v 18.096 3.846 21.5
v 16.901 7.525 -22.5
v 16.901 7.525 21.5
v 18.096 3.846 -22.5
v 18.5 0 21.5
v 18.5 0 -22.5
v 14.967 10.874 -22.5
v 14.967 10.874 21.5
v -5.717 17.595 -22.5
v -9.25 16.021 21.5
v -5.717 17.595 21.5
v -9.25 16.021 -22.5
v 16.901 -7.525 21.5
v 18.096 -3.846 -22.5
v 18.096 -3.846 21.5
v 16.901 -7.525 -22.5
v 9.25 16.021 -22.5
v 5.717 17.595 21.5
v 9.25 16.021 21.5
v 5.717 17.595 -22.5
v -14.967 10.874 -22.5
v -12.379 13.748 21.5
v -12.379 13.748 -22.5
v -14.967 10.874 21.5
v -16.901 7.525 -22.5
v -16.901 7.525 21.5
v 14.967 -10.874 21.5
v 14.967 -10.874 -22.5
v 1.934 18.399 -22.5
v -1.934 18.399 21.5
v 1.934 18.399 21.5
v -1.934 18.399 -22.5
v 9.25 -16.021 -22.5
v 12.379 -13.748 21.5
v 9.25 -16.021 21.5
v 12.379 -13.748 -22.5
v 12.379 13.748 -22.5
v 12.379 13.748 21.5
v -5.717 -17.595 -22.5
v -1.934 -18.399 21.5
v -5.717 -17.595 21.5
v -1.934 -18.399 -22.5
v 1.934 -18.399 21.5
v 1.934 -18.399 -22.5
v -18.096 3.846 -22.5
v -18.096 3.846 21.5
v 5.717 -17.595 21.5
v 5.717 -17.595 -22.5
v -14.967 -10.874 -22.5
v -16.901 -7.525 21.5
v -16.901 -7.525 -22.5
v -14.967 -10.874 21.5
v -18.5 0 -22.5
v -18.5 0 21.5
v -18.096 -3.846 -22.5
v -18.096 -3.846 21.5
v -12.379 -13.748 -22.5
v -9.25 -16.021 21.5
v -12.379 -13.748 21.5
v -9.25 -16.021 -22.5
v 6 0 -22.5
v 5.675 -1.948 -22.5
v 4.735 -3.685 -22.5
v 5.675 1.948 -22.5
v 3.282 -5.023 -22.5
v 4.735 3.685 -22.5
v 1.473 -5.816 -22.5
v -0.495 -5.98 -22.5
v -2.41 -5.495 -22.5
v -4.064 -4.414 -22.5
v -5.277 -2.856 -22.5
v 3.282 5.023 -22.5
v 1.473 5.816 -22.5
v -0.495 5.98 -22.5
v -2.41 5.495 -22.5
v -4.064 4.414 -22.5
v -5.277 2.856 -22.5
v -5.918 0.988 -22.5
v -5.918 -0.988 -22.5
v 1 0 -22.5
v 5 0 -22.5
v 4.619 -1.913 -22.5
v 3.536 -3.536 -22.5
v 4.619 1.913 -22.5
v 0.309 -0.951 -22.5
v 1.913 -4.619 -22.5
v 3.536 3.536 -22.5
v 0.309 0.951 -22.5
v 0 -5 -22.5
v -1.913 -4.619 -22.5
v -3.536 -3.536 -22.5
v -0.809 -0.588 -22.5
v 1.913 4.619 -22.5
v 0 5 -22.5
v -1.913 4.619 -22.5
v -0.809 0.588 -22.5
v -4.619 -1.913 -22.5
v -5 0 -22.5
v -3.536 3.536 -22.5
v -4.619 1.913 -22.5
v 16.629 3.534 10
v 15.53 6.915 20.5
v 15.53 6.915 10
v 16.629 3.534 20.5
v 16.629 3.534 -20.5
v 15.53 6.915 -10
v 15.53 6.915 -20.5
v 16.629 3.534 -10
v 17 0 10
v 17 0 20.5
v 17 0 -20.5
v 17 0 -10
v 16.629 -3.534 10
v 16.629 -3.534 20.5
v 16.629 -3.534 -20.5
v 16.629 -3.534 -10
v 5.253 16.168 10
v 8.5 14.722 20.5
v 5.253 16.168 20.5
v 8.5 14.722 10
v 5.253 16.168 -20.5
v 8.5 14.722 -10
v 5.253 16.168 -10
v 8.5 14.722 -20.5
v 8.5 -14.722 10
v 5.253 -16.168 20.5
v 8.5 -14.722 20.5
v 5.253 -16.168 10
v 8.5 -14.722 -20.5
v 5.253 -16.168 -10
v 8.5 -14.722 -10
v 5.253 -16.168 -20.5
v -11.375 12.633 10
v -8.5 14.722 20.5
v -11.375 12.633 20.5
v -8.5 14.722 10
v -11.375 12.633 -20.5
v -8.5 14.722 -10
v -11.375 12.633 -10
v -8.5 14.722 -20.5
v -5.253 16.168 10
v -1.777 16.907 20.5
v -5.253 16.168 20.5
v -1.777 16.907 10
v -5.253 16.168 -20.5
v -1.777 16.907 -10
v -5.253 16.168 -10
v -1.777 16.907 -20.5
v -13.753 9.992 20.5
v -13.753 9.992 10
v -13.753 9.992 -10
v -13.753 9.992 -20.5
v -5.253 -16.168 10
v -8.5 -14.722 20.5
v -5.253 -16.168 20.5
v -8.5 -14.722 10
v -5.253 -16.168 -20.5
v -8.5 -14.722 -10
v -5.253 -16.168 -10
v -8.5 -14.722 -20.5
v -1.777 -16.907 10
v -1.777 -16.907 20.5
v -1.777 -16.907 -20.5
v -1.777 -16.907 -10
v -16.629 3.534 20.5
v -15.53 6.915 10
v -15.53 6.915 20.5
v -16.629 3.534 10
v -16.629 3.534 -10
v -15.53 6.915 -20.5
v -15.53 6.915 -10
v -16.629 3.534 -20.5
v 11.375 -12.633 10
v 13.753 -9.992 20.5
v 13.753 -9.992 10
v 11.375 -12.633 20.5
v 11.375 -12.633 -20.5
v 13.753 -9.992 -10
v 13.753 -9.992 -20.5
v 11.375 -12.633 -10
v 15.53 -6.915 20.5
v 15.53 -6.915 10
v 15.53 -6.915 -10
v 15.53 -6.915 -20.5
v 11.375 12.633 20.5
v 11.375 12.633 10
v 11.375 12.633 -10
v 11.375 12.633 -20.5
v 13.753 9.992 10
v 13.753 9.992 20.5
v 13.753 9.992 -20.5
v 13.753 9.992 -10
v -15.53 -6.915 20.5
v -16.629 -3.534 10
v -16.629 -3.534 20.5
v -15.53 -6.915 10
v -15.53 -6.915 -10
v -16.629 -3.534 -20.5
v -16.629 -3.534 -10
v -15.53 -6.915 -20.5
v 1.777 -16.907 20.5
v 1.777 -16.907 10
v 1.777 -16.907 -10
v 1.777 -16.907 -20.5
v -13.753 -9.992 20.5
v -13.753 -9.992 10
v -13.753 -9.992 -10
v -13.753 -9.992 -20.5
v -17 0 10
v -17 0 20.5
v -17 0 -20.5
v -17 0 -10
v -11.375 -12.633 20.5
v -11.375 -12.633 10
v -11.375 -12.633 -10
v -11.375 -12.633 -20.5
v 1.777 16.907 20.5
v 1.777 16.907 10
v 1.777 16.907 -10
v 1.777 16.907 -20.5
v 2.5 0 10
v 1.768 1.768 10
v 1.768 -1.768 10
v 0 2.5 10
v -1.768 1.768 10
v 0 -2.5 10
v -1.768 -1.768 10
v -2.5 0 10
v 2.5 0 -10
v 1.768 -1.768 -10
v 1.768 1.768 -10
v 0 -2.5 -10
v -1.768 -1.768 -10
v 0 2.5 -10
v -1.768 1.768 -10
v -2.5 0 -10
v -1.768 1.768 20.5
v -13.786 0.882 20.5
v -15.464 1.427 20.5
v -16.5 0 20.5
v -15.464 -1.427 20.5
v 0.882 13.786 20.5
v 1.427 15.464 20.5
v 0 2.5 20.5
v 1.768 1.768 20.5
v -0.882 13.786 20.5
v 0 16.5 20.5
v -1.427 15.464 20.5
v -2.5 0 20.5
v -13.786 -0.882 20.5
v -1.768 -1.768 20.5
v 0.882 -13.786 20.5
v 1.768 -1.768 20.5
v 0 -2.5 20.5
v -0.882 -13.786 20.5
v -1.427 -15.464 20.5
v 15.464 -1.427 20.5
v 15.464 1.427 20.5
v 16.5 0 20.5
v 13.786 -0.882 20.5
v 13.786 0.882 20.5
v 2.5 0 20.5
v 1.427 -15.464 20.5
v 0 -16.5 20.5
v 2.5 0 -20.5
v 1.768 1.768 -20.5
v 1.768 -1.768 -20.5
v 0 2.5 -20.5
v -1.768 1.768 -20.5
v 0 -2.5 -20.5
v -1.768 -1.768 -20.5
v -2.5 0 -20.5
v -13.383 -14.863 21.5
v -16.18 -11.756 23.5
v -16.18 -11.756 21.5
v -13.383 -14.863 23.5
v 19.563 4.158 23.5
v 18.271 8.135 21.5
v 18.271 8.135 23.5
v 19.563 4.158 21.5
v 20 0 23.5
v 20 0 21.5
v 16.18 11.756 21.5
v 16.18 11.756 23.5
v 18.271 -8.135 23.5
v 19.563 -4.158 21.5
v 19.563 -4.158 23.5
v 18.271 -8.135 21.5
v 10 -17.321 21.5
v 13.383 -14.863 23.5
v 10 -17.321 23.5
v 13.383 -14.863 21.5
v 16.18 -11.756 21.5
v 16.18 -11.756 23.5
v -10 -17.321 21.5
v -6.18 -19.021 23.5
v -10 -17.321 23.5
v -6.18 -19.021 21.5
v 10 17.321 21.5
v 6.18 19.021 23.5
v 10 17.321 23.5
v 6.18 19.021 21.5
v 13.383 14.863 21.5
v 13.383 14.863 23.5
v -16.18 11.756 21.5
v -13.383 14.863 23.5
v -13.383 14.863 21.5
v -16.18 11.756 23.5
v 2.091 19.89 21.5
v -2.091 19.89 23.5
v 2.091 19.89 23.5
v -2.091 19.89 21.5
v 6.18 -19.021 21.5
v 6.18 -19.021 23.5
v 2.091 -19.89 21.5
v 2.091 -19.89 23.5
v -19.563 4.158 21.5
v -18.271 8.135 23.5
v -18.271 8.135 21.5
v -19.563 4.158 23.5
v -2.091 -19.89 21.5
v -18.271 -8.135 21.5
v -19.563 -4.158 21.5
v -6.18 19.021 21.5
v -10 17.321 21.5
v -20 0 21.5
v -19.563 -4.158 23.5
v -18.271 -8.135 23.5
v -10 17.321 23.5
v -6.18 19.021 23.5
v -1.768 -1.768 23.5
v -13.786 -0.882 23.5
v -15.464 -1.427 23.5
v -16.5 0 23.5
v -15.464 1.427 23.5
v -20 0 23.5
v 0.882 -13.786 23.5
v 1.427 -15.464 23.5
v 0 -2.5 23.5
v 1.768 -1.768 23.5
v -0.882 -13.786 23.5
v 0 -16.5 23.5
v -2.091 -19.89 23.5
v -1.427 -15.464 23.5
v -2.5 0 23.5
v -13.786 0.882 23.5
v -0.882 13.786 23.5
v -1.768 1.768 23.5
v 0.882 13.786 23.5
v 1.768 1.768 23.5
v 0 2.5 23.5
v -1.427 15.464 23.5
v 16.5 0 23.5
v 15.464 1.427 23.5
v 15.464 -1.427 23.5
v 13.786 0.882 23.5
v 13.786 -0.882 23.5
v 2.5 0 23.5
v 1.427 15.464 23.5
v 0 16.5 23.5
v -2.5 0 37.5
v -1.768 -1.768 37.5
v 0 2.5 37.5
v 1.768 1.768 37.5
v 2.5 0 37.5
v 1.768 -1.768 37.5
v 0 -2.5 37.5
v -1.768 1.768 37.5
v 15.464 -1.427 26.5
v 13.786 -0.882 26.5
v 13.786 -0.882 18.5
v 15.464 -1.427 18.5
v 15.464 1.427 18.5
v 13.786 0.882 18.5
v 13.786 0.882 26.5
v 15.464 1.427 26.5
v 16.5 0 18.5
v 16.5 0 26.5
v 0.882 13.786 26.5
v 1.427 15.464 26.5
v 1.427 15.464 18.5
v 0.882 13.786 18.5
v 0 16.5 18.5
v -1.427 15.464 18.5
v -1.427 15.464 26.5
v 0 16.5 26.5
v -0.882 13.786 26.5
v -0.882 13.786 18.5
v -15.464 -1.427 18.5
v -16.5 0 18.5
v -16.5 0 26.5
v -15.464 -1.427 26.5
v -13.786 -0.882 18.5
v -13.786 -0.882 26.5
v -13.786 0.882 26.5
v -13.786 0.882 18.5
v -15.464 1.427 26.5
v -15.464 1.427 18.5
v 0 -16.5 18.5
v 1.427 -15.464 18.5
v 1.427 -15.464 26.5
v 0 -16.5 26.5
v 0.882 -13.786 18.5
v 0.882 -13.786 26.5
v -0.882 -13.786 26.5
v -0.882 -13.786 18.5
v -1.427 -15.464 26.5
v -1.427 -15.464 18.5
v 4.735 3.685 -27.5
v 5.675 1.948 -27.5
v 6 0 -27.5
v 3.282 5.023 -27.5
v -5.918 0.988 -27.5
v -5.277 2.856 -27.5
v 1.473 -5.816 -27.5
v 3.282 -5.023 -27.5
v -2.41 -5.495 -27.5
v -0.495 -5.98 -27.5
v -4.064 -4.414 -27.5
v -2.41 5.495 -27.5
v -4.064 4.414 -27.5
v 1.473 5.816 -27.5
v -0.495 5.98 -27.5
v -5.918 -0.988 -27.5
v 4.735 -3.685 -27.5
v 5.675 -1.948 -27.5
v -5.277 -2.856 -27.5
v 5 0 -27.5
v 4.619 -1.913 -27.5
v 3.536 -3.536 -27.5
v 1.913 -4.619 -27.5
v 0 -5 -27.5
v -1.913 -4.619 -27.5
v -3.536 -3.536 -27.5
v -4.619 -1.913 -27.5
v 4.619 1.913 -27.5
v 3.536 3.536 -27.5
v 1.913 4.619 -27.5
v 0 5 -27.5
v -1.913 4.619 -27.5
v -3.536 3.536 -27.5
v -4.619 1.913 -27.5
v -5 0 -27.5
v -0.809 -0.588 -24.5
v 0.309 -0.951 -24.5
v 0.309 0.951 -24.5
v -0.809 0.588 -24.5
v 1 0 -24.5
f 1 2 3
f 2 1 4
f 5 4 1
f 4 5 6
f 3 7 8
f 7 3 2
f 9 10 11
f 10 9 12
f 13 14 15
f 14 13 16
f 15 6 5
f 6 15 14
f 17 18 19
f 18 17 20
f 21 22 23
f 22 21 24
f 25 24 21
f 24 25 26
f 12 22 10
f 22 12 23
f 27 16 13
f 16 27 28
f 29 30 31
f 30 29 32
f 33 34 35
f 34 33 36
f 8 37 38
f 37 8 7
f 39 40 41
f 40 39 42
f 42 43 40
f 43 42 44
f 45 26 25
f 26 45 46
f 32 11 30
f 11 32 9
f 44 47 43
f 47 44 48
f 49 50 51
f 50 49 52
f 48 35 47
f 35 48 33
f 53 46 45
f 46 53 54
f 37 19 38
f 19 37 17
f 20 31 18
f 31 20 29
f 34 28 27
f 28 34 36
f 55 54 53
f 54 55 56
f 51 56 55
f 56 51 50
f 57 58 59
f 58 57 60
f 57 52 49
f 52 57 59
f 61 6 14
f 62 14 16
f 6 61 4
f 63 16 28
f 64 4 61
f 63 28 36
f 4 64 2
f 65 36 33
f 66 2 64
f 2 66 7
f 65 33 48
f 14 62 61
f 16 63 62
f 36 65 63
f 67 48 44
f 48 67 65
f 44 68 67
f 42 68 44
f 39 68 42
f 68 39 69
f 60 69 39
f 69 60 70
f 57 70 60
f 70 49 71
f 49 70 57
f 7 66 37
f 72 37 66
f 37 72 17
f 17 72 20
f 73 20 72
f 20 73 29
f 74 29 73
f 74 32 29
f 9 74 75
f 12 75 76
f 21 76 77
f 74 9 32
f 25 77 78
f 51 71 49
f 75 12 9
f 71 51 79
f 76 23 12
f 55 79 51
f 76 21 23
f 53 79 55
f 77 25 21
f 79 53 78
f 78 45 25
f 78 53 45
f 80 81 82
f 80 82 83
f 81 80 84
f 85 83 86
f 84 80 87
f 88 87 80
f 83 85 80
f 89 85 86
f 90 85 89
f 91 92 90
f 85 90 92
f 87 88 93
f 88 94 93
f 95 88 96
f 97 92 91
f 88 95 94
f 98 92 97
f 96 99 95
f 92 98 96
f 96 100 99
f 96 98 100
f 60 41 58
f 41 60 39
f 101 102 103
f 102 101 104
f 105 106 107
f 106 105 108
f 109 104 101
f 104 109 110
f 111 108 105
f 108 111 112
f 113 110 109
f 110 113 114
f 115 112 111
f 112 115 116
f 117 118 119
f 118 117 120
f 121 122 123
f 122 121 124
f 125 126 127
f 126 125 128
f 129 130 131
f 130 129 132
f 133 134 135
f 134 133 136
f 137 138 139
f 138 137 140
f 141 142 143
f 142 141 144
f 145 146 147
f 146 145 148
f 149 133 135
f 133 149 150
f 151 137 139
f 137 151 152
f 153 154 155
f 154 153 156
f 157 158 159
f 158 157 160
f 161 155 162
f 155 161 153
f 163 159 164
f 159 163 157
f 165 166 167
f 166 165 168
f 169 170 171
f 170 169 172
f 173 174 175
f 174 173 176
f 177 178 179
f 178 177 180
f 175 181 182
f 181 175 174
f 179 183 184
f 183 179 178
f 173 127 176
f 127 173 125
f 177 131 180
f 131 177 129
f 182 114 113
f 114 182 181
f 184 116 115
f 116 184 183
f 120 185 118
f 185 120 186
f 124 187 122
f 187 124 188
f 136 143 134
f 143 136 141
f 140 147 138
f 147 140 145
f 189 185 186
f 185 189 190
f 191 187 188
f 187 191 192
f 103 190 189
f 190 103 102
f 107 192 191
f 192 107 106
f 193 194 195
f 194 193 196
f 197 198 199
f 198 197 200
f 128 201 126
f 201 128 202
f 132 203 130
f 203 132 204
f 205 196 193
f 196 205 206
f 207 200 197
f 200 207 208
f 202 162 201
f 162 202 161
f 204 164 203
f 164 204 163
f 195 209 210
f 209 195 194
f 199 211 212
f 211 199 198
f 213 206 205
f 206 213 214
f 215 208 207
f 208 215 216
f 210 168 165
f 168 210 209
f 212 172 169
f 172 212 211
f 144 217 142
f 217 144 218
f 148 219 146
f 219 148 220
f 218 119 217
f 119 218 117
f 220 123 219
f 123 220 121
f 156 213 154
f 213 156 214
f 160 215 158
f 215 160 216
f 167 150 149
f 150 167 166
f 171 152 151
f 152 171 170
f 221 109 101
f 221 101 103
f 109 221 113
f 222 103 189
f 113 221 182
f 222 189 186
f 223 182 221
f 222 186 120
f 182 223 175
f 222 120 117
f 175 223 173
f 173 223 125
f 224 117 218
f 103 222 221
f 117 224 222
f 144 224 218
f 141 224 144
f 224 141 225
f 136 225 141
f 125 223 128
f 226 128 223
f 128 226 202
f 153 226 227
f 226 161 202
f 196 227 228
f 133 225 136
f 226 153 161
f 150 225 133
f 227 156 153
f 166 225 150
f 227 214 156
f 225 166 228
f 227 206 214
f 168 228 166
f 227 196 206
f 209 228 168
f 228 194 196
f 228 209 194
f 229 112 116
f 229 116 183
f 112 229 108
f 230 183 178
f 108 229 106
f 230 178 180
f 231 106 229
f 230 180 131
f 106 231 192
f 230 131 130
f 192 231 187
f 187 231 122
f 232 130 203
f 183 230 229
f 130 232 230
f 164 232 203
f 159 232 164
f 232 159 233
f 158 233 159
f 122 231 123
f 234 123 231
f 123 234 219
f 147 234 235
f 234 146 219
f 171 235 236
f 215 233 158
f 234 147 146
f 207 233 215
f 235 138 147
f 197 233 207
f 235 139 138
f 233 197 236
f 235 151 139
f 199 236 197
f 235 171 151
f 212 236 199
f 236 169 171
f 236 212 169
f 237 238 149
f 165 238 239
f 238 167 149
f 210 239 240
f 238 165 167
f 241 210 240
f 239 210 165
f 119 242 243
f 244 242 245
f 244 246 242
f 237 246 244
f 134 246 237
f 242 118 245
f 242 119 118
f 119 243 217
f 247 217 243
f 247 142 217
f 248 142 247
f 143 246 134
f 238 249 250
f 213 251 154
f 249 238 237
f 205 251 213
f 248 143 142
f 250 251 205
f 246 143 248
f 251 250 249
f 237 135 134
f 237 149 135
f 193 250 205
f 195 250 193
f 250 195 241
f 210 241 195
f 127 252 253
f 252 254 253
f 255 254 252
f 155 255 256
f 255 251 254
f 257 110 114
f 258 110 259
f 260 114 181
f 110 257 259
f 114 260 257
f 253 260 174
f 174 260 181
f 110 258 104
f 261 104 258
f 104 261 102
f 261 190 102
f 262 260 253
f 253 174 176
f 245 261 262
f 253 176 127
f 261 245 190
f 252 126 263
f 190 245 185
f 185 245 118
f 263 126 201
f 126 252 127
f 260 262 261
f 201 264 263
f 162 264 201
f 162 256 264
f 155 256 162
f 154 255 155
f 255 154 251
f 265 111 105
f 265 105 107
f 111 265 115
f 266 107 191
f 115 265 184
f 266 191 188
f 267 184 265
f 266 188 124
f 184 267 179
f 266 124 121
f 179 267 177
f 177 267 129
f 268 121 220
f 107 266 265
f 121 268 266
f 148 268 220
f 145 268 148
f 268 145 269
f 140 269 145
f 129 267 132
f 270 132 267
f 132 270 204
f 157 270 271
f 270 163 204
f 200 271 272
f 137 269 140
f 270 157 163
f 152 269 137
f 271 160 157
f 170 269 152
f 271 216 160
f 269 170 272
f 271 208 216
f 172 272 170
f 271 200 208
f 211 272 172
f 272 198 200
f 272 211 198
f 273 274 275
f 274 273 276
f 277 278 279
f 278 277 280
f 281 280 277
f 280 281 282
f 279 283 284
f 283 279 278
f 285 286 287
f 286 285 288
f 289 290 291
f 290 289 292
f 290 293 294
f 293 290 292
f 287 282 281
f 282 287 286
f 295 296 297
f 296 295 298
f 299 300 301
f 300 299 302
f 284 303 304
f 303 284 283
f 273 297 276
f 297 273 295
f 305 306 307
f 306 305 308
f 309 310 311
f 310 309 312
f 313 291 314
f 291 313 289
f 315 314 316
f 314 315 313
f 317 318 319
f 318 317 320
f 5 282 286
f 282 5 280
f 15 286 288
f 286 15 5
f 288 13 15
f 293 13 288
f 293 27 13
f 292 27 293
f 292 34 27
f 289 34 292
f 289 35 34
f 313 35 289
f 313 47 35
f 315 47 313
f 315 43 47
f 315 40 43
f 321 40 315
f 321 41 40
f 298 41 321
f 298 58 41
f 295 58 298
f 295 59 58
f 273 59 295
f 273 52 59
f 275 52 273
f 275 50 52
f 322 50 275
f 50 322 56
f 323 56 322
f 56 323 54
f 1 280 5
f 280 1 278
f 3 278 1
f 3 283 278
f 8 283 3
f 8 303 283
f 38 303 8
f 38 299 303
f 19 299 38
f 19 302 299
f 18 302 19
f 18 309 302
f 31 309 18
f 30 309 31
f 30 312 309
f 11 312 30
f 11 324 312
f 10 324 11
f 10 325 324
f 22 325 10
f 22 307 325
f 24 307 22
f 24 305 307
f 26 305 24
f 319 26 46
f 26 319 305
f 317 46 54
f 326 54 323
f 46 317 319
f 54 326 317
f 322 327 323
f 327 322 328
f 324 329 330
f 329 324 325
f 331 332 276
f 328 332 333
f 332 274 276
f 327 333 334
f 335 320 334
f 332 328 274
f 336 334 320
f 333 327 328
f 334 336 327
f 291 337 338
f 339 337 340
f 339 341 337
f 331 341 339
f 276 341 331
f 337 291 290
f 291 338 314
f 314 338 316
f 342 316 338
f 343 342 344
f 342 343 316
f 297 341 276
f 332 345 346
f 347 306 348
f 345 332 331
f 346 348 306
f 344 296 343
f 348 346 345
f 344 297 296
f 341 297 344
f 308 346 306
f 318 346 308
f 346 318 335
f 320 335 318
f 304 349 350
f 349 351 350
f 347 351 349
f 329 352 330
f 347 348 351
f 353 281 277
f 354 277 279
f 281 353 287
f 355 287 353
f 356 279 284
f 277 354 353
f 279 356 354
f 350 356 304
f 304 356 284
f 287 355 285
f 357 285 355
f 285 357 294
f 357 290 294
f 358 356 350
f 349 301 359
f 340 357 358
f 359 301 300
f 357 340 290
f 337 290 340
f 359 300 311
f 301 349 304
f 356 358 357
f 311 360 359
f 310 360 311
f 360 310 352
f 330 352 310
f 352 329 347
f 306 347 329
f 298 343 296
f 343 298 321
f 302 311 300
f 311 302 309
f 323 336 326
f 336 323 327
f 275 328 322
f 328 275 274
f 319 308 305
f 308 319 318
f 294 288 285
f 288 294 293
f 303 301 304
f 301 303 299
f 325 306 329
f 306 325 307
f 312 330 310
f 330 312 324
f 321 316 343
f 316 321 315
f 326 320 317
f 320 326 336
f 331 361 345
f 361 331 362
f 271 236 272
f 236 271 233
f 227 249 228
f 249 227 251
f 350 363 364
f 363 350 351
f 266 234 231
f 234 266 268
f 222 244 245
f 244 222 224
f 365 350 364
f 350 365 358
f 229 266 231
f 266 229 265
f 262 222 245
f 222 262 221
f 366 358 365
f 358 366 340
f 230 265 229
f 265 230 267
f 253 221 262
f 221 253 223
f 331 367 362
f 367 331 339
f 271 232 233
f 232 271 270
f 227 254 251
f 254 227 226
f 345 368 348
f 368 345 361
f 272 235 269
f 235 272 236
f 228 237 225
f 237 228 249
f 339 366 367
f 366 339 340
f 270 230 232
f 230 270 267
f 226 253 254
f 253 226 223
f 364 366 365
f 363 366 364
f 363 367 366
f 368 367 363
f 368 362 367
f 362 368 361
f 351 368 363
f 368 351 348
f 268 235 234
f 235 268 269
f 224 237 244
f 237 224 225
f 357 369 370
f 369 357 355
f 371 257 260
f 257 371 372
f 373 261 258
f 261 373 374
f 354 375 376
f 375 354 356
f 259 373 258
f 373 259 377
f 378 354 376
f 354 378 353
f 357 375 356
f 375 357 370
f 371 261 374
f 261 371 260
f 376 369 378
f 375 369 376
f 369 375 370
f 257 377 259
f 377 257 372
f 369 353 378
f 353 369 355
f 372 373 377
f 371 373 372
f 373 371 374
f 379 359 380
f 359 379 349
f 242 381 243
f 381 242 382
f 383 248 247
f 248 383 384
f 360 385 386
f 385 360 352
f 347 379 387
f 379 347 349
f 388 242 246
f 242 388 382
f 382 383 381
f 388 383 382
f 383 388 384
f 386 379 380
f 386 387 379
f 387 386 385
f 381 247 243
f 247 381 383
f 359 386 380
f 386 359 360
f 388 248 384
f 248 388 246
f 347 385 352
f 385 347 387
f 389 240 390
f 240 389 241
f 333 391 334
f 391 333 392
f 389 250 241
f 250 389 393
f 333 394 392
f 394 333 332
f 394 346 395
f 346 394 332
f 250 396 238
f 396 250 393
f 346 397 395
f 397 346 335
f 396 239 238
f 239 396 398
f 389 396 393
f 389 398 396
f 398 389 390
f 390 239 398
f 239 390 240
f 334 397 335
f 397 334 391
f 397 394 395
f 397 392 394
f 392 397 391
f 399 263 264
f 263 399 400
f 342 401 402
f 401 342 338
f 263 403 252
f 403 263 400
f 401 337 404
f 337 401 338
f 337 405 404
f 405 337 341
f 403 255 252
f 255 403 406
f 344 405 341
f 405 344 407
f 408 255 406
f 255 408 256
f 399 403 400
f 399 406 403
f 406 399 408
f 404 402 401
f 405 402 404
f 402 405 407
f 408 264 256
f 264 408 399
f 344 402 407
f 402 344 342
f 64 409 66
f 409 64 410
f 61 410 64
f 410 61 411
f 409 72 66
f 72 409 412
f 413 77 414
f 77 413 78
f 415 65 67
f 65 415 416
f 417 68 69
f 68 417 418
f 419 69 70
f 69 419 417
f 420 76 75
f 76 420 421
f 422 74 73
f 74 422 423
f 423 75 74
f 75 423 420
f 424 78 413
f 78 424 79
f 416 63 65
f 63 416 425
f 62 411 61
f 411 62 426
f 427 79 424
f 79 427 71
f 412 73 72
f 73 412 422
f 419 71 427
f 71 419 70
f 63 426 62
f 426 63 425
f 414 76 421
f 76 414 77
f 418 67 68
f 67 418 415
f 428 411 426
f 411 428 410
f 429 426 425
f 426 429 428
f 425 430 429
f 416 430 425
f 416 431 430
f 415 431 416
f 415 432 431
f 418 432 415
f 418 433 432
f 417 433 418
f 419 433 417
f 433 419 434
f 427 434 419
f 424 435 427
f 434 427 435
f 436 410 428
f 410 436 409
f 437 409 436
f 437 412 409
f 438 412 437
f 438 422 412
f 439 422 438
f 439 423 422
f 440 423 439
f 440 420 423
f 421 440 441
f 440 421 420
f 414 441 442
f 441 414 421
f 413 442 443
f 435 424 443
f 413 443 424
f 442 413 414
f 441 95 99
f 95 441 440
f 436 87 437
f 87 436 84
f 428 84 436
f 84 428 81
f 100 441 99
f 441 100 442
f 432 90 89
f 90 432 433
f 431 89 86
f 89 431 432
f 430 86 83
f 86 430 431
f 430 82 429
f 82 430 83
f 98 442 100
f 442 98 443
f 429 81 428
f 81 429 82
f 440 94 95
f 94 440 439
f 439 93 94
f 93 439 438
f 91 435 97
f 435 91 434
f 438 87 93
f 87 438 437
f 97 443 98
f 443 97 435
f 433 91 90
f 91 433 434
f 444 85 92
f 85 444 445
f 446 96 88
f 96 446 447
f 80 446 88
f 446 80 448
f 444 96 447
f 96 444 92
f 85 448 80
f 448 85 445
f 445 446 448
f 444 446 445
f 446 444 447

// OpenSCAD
// Parameters
stator_diameter_mm = 35.0; //[17.5:70.0:0.5]
motor_height_mm = 45.0; //[22.5:90.0:0.5]
can_wall_thickness_mm = 1.5; //[0.75:3.0:0.1]
can_outer_diameter_mm = 37.0; //[18.5:74.0:0.5]
stator_height_mm = 20.0; //[10.0:40.0:0.5]
air_gap_mm = 0.5; //[0.2:1.5:0.1]
shaft_diameter_mm = 5.0; //[2.5:10.0:0.1]
shaft_protrusion_front_mm = 15.0; //[0.0:30.0:0.5]
shaft_protrusion_rear_mm = 0.0; //[0.0:30.0:0.5]
endcap_thickness_mm = 2.0; //[1.0:5.0:0.5]
flange_thickness_mm = 2.0; //[1.0:6.0:0.5]
flange_outer_diameter_mm = 40.0; //[20.0:80.0:0.5]
mount_hole_count = 4; //[2:12:1]
mount_hole_diameter_mm = 3.0; //[1.5:6.0:0.1]
mount_hole_circle_diameter_mm = 30.0; //[15.0:60.0:0.5]
overlap_mm = 1.0; //[0.5:2.0:0.1]
buzzer_diameter_mm = 12.0; //[6.0:24.0:0.5]
buzzer_height_mm = 6.0; //[3.0:15.0:0.5]
buzzer_pin_diameter_mm = 2.0; //[1.0:4.0:0.1]
buzzer_pin_height_mm = 3.0; //[1.0:8.0:0.5]

// Buzzer module
module buzzer() {
  color([0.2, 0.2, 0.2]) {
    difference() {
      // Buzzer body
      cylinder(r=buzzer_diameter_mm/2, h=buzzer_height_mm, center=true);
      // Inner hollow
      cylinder(r=buzzer_diameter_mm/2 - (buzzer_height_mm > 5 ? 1 : 0.75), h=buzzer_height_mm, center=true);
    }
    // Buzzer pin
    translate([0, 0, buzzer_height_mm/2 - buzzer_pin_height_mm/2])
      cylinder(r=buzzer_pin_diameter_mm/2, h=buzzer_pin_height_mm, center=true);
  }
}

// Motor assembly
module assembly() {
  color("Black") {
    // Motor can
    difference() {
      cylinder(r=can_outer_diameter_mm/2, h=motor_height_mm, center=true);
      translate([0, 0, 0])
        cylinder(r=can_outer_diameter_mm/2 - can_wall_thickness_mm, h=motor_height_mm - 2*endcap_thickness_mm + 2*overlap_mm, center=true);
    }
    // Stator core
    translate([0, 0, 0])
      cylinder(r=stator_diameter_mm/2, h=stator_height_mm, center=true);
    // Front endcap
    translate([0, 0, motor_height_mm/2 - endcap_thickness_mm/2])
      cylinder(r=can_outer_diameter_mm/2 - can_wall_thickness_mm + overlap_mm, h=endcap_thickness_mm, center=true);
    // Rear endcap
    translate([0, 0, -motor_height_mm/2 + endcap_thickness_mm/2])
      cylinder(r=can_outer_diameter_mm/2 - can_wall_thickness_mm + overlap_mm, h=endcap_thickness_mm, center=true);
    // Mounting flange
    translate([0, 0, motor_height_mm/2 + flange_thickness_mm/2 - overlap_mm])
      cylinder(r=flange_outer_diameter_mm/2, h=flange_thickness_mm, center=true);
    // Central shaft
    translate([0, 0, (shaft_protrusion_front_mm - shaft_protrusion_rear_mm)/2])
      cylinder(r=shaft_diameter_mm/2, h=motor_height_mm + shaft_protrusion_front_mm + shaft_protrusion_rear_mm, center=true);
  }
  
  // Mounting holes
  color("Silver") {
    for (angle = [0, 90, 180, 270]) {
      rotate([0, 0, angle])
        translate([mount_hole_circle_diameter_mm/2, 0, motor_height_mm/2 + flange_thickness_mm/2 - overlap_mm])
          cylinder(r=mount_hole_diameter_mm/2, h=flange_thickness_mm + endcap_thickness_mm + 4*overlap_mm, center=true);
    }
  }
  
  // Buzzer
  translate([0, 0, -motor_height_mm/2 - buzzer_height_mm/2 + overlap_mm])
    buzzer();
}

assembly();
